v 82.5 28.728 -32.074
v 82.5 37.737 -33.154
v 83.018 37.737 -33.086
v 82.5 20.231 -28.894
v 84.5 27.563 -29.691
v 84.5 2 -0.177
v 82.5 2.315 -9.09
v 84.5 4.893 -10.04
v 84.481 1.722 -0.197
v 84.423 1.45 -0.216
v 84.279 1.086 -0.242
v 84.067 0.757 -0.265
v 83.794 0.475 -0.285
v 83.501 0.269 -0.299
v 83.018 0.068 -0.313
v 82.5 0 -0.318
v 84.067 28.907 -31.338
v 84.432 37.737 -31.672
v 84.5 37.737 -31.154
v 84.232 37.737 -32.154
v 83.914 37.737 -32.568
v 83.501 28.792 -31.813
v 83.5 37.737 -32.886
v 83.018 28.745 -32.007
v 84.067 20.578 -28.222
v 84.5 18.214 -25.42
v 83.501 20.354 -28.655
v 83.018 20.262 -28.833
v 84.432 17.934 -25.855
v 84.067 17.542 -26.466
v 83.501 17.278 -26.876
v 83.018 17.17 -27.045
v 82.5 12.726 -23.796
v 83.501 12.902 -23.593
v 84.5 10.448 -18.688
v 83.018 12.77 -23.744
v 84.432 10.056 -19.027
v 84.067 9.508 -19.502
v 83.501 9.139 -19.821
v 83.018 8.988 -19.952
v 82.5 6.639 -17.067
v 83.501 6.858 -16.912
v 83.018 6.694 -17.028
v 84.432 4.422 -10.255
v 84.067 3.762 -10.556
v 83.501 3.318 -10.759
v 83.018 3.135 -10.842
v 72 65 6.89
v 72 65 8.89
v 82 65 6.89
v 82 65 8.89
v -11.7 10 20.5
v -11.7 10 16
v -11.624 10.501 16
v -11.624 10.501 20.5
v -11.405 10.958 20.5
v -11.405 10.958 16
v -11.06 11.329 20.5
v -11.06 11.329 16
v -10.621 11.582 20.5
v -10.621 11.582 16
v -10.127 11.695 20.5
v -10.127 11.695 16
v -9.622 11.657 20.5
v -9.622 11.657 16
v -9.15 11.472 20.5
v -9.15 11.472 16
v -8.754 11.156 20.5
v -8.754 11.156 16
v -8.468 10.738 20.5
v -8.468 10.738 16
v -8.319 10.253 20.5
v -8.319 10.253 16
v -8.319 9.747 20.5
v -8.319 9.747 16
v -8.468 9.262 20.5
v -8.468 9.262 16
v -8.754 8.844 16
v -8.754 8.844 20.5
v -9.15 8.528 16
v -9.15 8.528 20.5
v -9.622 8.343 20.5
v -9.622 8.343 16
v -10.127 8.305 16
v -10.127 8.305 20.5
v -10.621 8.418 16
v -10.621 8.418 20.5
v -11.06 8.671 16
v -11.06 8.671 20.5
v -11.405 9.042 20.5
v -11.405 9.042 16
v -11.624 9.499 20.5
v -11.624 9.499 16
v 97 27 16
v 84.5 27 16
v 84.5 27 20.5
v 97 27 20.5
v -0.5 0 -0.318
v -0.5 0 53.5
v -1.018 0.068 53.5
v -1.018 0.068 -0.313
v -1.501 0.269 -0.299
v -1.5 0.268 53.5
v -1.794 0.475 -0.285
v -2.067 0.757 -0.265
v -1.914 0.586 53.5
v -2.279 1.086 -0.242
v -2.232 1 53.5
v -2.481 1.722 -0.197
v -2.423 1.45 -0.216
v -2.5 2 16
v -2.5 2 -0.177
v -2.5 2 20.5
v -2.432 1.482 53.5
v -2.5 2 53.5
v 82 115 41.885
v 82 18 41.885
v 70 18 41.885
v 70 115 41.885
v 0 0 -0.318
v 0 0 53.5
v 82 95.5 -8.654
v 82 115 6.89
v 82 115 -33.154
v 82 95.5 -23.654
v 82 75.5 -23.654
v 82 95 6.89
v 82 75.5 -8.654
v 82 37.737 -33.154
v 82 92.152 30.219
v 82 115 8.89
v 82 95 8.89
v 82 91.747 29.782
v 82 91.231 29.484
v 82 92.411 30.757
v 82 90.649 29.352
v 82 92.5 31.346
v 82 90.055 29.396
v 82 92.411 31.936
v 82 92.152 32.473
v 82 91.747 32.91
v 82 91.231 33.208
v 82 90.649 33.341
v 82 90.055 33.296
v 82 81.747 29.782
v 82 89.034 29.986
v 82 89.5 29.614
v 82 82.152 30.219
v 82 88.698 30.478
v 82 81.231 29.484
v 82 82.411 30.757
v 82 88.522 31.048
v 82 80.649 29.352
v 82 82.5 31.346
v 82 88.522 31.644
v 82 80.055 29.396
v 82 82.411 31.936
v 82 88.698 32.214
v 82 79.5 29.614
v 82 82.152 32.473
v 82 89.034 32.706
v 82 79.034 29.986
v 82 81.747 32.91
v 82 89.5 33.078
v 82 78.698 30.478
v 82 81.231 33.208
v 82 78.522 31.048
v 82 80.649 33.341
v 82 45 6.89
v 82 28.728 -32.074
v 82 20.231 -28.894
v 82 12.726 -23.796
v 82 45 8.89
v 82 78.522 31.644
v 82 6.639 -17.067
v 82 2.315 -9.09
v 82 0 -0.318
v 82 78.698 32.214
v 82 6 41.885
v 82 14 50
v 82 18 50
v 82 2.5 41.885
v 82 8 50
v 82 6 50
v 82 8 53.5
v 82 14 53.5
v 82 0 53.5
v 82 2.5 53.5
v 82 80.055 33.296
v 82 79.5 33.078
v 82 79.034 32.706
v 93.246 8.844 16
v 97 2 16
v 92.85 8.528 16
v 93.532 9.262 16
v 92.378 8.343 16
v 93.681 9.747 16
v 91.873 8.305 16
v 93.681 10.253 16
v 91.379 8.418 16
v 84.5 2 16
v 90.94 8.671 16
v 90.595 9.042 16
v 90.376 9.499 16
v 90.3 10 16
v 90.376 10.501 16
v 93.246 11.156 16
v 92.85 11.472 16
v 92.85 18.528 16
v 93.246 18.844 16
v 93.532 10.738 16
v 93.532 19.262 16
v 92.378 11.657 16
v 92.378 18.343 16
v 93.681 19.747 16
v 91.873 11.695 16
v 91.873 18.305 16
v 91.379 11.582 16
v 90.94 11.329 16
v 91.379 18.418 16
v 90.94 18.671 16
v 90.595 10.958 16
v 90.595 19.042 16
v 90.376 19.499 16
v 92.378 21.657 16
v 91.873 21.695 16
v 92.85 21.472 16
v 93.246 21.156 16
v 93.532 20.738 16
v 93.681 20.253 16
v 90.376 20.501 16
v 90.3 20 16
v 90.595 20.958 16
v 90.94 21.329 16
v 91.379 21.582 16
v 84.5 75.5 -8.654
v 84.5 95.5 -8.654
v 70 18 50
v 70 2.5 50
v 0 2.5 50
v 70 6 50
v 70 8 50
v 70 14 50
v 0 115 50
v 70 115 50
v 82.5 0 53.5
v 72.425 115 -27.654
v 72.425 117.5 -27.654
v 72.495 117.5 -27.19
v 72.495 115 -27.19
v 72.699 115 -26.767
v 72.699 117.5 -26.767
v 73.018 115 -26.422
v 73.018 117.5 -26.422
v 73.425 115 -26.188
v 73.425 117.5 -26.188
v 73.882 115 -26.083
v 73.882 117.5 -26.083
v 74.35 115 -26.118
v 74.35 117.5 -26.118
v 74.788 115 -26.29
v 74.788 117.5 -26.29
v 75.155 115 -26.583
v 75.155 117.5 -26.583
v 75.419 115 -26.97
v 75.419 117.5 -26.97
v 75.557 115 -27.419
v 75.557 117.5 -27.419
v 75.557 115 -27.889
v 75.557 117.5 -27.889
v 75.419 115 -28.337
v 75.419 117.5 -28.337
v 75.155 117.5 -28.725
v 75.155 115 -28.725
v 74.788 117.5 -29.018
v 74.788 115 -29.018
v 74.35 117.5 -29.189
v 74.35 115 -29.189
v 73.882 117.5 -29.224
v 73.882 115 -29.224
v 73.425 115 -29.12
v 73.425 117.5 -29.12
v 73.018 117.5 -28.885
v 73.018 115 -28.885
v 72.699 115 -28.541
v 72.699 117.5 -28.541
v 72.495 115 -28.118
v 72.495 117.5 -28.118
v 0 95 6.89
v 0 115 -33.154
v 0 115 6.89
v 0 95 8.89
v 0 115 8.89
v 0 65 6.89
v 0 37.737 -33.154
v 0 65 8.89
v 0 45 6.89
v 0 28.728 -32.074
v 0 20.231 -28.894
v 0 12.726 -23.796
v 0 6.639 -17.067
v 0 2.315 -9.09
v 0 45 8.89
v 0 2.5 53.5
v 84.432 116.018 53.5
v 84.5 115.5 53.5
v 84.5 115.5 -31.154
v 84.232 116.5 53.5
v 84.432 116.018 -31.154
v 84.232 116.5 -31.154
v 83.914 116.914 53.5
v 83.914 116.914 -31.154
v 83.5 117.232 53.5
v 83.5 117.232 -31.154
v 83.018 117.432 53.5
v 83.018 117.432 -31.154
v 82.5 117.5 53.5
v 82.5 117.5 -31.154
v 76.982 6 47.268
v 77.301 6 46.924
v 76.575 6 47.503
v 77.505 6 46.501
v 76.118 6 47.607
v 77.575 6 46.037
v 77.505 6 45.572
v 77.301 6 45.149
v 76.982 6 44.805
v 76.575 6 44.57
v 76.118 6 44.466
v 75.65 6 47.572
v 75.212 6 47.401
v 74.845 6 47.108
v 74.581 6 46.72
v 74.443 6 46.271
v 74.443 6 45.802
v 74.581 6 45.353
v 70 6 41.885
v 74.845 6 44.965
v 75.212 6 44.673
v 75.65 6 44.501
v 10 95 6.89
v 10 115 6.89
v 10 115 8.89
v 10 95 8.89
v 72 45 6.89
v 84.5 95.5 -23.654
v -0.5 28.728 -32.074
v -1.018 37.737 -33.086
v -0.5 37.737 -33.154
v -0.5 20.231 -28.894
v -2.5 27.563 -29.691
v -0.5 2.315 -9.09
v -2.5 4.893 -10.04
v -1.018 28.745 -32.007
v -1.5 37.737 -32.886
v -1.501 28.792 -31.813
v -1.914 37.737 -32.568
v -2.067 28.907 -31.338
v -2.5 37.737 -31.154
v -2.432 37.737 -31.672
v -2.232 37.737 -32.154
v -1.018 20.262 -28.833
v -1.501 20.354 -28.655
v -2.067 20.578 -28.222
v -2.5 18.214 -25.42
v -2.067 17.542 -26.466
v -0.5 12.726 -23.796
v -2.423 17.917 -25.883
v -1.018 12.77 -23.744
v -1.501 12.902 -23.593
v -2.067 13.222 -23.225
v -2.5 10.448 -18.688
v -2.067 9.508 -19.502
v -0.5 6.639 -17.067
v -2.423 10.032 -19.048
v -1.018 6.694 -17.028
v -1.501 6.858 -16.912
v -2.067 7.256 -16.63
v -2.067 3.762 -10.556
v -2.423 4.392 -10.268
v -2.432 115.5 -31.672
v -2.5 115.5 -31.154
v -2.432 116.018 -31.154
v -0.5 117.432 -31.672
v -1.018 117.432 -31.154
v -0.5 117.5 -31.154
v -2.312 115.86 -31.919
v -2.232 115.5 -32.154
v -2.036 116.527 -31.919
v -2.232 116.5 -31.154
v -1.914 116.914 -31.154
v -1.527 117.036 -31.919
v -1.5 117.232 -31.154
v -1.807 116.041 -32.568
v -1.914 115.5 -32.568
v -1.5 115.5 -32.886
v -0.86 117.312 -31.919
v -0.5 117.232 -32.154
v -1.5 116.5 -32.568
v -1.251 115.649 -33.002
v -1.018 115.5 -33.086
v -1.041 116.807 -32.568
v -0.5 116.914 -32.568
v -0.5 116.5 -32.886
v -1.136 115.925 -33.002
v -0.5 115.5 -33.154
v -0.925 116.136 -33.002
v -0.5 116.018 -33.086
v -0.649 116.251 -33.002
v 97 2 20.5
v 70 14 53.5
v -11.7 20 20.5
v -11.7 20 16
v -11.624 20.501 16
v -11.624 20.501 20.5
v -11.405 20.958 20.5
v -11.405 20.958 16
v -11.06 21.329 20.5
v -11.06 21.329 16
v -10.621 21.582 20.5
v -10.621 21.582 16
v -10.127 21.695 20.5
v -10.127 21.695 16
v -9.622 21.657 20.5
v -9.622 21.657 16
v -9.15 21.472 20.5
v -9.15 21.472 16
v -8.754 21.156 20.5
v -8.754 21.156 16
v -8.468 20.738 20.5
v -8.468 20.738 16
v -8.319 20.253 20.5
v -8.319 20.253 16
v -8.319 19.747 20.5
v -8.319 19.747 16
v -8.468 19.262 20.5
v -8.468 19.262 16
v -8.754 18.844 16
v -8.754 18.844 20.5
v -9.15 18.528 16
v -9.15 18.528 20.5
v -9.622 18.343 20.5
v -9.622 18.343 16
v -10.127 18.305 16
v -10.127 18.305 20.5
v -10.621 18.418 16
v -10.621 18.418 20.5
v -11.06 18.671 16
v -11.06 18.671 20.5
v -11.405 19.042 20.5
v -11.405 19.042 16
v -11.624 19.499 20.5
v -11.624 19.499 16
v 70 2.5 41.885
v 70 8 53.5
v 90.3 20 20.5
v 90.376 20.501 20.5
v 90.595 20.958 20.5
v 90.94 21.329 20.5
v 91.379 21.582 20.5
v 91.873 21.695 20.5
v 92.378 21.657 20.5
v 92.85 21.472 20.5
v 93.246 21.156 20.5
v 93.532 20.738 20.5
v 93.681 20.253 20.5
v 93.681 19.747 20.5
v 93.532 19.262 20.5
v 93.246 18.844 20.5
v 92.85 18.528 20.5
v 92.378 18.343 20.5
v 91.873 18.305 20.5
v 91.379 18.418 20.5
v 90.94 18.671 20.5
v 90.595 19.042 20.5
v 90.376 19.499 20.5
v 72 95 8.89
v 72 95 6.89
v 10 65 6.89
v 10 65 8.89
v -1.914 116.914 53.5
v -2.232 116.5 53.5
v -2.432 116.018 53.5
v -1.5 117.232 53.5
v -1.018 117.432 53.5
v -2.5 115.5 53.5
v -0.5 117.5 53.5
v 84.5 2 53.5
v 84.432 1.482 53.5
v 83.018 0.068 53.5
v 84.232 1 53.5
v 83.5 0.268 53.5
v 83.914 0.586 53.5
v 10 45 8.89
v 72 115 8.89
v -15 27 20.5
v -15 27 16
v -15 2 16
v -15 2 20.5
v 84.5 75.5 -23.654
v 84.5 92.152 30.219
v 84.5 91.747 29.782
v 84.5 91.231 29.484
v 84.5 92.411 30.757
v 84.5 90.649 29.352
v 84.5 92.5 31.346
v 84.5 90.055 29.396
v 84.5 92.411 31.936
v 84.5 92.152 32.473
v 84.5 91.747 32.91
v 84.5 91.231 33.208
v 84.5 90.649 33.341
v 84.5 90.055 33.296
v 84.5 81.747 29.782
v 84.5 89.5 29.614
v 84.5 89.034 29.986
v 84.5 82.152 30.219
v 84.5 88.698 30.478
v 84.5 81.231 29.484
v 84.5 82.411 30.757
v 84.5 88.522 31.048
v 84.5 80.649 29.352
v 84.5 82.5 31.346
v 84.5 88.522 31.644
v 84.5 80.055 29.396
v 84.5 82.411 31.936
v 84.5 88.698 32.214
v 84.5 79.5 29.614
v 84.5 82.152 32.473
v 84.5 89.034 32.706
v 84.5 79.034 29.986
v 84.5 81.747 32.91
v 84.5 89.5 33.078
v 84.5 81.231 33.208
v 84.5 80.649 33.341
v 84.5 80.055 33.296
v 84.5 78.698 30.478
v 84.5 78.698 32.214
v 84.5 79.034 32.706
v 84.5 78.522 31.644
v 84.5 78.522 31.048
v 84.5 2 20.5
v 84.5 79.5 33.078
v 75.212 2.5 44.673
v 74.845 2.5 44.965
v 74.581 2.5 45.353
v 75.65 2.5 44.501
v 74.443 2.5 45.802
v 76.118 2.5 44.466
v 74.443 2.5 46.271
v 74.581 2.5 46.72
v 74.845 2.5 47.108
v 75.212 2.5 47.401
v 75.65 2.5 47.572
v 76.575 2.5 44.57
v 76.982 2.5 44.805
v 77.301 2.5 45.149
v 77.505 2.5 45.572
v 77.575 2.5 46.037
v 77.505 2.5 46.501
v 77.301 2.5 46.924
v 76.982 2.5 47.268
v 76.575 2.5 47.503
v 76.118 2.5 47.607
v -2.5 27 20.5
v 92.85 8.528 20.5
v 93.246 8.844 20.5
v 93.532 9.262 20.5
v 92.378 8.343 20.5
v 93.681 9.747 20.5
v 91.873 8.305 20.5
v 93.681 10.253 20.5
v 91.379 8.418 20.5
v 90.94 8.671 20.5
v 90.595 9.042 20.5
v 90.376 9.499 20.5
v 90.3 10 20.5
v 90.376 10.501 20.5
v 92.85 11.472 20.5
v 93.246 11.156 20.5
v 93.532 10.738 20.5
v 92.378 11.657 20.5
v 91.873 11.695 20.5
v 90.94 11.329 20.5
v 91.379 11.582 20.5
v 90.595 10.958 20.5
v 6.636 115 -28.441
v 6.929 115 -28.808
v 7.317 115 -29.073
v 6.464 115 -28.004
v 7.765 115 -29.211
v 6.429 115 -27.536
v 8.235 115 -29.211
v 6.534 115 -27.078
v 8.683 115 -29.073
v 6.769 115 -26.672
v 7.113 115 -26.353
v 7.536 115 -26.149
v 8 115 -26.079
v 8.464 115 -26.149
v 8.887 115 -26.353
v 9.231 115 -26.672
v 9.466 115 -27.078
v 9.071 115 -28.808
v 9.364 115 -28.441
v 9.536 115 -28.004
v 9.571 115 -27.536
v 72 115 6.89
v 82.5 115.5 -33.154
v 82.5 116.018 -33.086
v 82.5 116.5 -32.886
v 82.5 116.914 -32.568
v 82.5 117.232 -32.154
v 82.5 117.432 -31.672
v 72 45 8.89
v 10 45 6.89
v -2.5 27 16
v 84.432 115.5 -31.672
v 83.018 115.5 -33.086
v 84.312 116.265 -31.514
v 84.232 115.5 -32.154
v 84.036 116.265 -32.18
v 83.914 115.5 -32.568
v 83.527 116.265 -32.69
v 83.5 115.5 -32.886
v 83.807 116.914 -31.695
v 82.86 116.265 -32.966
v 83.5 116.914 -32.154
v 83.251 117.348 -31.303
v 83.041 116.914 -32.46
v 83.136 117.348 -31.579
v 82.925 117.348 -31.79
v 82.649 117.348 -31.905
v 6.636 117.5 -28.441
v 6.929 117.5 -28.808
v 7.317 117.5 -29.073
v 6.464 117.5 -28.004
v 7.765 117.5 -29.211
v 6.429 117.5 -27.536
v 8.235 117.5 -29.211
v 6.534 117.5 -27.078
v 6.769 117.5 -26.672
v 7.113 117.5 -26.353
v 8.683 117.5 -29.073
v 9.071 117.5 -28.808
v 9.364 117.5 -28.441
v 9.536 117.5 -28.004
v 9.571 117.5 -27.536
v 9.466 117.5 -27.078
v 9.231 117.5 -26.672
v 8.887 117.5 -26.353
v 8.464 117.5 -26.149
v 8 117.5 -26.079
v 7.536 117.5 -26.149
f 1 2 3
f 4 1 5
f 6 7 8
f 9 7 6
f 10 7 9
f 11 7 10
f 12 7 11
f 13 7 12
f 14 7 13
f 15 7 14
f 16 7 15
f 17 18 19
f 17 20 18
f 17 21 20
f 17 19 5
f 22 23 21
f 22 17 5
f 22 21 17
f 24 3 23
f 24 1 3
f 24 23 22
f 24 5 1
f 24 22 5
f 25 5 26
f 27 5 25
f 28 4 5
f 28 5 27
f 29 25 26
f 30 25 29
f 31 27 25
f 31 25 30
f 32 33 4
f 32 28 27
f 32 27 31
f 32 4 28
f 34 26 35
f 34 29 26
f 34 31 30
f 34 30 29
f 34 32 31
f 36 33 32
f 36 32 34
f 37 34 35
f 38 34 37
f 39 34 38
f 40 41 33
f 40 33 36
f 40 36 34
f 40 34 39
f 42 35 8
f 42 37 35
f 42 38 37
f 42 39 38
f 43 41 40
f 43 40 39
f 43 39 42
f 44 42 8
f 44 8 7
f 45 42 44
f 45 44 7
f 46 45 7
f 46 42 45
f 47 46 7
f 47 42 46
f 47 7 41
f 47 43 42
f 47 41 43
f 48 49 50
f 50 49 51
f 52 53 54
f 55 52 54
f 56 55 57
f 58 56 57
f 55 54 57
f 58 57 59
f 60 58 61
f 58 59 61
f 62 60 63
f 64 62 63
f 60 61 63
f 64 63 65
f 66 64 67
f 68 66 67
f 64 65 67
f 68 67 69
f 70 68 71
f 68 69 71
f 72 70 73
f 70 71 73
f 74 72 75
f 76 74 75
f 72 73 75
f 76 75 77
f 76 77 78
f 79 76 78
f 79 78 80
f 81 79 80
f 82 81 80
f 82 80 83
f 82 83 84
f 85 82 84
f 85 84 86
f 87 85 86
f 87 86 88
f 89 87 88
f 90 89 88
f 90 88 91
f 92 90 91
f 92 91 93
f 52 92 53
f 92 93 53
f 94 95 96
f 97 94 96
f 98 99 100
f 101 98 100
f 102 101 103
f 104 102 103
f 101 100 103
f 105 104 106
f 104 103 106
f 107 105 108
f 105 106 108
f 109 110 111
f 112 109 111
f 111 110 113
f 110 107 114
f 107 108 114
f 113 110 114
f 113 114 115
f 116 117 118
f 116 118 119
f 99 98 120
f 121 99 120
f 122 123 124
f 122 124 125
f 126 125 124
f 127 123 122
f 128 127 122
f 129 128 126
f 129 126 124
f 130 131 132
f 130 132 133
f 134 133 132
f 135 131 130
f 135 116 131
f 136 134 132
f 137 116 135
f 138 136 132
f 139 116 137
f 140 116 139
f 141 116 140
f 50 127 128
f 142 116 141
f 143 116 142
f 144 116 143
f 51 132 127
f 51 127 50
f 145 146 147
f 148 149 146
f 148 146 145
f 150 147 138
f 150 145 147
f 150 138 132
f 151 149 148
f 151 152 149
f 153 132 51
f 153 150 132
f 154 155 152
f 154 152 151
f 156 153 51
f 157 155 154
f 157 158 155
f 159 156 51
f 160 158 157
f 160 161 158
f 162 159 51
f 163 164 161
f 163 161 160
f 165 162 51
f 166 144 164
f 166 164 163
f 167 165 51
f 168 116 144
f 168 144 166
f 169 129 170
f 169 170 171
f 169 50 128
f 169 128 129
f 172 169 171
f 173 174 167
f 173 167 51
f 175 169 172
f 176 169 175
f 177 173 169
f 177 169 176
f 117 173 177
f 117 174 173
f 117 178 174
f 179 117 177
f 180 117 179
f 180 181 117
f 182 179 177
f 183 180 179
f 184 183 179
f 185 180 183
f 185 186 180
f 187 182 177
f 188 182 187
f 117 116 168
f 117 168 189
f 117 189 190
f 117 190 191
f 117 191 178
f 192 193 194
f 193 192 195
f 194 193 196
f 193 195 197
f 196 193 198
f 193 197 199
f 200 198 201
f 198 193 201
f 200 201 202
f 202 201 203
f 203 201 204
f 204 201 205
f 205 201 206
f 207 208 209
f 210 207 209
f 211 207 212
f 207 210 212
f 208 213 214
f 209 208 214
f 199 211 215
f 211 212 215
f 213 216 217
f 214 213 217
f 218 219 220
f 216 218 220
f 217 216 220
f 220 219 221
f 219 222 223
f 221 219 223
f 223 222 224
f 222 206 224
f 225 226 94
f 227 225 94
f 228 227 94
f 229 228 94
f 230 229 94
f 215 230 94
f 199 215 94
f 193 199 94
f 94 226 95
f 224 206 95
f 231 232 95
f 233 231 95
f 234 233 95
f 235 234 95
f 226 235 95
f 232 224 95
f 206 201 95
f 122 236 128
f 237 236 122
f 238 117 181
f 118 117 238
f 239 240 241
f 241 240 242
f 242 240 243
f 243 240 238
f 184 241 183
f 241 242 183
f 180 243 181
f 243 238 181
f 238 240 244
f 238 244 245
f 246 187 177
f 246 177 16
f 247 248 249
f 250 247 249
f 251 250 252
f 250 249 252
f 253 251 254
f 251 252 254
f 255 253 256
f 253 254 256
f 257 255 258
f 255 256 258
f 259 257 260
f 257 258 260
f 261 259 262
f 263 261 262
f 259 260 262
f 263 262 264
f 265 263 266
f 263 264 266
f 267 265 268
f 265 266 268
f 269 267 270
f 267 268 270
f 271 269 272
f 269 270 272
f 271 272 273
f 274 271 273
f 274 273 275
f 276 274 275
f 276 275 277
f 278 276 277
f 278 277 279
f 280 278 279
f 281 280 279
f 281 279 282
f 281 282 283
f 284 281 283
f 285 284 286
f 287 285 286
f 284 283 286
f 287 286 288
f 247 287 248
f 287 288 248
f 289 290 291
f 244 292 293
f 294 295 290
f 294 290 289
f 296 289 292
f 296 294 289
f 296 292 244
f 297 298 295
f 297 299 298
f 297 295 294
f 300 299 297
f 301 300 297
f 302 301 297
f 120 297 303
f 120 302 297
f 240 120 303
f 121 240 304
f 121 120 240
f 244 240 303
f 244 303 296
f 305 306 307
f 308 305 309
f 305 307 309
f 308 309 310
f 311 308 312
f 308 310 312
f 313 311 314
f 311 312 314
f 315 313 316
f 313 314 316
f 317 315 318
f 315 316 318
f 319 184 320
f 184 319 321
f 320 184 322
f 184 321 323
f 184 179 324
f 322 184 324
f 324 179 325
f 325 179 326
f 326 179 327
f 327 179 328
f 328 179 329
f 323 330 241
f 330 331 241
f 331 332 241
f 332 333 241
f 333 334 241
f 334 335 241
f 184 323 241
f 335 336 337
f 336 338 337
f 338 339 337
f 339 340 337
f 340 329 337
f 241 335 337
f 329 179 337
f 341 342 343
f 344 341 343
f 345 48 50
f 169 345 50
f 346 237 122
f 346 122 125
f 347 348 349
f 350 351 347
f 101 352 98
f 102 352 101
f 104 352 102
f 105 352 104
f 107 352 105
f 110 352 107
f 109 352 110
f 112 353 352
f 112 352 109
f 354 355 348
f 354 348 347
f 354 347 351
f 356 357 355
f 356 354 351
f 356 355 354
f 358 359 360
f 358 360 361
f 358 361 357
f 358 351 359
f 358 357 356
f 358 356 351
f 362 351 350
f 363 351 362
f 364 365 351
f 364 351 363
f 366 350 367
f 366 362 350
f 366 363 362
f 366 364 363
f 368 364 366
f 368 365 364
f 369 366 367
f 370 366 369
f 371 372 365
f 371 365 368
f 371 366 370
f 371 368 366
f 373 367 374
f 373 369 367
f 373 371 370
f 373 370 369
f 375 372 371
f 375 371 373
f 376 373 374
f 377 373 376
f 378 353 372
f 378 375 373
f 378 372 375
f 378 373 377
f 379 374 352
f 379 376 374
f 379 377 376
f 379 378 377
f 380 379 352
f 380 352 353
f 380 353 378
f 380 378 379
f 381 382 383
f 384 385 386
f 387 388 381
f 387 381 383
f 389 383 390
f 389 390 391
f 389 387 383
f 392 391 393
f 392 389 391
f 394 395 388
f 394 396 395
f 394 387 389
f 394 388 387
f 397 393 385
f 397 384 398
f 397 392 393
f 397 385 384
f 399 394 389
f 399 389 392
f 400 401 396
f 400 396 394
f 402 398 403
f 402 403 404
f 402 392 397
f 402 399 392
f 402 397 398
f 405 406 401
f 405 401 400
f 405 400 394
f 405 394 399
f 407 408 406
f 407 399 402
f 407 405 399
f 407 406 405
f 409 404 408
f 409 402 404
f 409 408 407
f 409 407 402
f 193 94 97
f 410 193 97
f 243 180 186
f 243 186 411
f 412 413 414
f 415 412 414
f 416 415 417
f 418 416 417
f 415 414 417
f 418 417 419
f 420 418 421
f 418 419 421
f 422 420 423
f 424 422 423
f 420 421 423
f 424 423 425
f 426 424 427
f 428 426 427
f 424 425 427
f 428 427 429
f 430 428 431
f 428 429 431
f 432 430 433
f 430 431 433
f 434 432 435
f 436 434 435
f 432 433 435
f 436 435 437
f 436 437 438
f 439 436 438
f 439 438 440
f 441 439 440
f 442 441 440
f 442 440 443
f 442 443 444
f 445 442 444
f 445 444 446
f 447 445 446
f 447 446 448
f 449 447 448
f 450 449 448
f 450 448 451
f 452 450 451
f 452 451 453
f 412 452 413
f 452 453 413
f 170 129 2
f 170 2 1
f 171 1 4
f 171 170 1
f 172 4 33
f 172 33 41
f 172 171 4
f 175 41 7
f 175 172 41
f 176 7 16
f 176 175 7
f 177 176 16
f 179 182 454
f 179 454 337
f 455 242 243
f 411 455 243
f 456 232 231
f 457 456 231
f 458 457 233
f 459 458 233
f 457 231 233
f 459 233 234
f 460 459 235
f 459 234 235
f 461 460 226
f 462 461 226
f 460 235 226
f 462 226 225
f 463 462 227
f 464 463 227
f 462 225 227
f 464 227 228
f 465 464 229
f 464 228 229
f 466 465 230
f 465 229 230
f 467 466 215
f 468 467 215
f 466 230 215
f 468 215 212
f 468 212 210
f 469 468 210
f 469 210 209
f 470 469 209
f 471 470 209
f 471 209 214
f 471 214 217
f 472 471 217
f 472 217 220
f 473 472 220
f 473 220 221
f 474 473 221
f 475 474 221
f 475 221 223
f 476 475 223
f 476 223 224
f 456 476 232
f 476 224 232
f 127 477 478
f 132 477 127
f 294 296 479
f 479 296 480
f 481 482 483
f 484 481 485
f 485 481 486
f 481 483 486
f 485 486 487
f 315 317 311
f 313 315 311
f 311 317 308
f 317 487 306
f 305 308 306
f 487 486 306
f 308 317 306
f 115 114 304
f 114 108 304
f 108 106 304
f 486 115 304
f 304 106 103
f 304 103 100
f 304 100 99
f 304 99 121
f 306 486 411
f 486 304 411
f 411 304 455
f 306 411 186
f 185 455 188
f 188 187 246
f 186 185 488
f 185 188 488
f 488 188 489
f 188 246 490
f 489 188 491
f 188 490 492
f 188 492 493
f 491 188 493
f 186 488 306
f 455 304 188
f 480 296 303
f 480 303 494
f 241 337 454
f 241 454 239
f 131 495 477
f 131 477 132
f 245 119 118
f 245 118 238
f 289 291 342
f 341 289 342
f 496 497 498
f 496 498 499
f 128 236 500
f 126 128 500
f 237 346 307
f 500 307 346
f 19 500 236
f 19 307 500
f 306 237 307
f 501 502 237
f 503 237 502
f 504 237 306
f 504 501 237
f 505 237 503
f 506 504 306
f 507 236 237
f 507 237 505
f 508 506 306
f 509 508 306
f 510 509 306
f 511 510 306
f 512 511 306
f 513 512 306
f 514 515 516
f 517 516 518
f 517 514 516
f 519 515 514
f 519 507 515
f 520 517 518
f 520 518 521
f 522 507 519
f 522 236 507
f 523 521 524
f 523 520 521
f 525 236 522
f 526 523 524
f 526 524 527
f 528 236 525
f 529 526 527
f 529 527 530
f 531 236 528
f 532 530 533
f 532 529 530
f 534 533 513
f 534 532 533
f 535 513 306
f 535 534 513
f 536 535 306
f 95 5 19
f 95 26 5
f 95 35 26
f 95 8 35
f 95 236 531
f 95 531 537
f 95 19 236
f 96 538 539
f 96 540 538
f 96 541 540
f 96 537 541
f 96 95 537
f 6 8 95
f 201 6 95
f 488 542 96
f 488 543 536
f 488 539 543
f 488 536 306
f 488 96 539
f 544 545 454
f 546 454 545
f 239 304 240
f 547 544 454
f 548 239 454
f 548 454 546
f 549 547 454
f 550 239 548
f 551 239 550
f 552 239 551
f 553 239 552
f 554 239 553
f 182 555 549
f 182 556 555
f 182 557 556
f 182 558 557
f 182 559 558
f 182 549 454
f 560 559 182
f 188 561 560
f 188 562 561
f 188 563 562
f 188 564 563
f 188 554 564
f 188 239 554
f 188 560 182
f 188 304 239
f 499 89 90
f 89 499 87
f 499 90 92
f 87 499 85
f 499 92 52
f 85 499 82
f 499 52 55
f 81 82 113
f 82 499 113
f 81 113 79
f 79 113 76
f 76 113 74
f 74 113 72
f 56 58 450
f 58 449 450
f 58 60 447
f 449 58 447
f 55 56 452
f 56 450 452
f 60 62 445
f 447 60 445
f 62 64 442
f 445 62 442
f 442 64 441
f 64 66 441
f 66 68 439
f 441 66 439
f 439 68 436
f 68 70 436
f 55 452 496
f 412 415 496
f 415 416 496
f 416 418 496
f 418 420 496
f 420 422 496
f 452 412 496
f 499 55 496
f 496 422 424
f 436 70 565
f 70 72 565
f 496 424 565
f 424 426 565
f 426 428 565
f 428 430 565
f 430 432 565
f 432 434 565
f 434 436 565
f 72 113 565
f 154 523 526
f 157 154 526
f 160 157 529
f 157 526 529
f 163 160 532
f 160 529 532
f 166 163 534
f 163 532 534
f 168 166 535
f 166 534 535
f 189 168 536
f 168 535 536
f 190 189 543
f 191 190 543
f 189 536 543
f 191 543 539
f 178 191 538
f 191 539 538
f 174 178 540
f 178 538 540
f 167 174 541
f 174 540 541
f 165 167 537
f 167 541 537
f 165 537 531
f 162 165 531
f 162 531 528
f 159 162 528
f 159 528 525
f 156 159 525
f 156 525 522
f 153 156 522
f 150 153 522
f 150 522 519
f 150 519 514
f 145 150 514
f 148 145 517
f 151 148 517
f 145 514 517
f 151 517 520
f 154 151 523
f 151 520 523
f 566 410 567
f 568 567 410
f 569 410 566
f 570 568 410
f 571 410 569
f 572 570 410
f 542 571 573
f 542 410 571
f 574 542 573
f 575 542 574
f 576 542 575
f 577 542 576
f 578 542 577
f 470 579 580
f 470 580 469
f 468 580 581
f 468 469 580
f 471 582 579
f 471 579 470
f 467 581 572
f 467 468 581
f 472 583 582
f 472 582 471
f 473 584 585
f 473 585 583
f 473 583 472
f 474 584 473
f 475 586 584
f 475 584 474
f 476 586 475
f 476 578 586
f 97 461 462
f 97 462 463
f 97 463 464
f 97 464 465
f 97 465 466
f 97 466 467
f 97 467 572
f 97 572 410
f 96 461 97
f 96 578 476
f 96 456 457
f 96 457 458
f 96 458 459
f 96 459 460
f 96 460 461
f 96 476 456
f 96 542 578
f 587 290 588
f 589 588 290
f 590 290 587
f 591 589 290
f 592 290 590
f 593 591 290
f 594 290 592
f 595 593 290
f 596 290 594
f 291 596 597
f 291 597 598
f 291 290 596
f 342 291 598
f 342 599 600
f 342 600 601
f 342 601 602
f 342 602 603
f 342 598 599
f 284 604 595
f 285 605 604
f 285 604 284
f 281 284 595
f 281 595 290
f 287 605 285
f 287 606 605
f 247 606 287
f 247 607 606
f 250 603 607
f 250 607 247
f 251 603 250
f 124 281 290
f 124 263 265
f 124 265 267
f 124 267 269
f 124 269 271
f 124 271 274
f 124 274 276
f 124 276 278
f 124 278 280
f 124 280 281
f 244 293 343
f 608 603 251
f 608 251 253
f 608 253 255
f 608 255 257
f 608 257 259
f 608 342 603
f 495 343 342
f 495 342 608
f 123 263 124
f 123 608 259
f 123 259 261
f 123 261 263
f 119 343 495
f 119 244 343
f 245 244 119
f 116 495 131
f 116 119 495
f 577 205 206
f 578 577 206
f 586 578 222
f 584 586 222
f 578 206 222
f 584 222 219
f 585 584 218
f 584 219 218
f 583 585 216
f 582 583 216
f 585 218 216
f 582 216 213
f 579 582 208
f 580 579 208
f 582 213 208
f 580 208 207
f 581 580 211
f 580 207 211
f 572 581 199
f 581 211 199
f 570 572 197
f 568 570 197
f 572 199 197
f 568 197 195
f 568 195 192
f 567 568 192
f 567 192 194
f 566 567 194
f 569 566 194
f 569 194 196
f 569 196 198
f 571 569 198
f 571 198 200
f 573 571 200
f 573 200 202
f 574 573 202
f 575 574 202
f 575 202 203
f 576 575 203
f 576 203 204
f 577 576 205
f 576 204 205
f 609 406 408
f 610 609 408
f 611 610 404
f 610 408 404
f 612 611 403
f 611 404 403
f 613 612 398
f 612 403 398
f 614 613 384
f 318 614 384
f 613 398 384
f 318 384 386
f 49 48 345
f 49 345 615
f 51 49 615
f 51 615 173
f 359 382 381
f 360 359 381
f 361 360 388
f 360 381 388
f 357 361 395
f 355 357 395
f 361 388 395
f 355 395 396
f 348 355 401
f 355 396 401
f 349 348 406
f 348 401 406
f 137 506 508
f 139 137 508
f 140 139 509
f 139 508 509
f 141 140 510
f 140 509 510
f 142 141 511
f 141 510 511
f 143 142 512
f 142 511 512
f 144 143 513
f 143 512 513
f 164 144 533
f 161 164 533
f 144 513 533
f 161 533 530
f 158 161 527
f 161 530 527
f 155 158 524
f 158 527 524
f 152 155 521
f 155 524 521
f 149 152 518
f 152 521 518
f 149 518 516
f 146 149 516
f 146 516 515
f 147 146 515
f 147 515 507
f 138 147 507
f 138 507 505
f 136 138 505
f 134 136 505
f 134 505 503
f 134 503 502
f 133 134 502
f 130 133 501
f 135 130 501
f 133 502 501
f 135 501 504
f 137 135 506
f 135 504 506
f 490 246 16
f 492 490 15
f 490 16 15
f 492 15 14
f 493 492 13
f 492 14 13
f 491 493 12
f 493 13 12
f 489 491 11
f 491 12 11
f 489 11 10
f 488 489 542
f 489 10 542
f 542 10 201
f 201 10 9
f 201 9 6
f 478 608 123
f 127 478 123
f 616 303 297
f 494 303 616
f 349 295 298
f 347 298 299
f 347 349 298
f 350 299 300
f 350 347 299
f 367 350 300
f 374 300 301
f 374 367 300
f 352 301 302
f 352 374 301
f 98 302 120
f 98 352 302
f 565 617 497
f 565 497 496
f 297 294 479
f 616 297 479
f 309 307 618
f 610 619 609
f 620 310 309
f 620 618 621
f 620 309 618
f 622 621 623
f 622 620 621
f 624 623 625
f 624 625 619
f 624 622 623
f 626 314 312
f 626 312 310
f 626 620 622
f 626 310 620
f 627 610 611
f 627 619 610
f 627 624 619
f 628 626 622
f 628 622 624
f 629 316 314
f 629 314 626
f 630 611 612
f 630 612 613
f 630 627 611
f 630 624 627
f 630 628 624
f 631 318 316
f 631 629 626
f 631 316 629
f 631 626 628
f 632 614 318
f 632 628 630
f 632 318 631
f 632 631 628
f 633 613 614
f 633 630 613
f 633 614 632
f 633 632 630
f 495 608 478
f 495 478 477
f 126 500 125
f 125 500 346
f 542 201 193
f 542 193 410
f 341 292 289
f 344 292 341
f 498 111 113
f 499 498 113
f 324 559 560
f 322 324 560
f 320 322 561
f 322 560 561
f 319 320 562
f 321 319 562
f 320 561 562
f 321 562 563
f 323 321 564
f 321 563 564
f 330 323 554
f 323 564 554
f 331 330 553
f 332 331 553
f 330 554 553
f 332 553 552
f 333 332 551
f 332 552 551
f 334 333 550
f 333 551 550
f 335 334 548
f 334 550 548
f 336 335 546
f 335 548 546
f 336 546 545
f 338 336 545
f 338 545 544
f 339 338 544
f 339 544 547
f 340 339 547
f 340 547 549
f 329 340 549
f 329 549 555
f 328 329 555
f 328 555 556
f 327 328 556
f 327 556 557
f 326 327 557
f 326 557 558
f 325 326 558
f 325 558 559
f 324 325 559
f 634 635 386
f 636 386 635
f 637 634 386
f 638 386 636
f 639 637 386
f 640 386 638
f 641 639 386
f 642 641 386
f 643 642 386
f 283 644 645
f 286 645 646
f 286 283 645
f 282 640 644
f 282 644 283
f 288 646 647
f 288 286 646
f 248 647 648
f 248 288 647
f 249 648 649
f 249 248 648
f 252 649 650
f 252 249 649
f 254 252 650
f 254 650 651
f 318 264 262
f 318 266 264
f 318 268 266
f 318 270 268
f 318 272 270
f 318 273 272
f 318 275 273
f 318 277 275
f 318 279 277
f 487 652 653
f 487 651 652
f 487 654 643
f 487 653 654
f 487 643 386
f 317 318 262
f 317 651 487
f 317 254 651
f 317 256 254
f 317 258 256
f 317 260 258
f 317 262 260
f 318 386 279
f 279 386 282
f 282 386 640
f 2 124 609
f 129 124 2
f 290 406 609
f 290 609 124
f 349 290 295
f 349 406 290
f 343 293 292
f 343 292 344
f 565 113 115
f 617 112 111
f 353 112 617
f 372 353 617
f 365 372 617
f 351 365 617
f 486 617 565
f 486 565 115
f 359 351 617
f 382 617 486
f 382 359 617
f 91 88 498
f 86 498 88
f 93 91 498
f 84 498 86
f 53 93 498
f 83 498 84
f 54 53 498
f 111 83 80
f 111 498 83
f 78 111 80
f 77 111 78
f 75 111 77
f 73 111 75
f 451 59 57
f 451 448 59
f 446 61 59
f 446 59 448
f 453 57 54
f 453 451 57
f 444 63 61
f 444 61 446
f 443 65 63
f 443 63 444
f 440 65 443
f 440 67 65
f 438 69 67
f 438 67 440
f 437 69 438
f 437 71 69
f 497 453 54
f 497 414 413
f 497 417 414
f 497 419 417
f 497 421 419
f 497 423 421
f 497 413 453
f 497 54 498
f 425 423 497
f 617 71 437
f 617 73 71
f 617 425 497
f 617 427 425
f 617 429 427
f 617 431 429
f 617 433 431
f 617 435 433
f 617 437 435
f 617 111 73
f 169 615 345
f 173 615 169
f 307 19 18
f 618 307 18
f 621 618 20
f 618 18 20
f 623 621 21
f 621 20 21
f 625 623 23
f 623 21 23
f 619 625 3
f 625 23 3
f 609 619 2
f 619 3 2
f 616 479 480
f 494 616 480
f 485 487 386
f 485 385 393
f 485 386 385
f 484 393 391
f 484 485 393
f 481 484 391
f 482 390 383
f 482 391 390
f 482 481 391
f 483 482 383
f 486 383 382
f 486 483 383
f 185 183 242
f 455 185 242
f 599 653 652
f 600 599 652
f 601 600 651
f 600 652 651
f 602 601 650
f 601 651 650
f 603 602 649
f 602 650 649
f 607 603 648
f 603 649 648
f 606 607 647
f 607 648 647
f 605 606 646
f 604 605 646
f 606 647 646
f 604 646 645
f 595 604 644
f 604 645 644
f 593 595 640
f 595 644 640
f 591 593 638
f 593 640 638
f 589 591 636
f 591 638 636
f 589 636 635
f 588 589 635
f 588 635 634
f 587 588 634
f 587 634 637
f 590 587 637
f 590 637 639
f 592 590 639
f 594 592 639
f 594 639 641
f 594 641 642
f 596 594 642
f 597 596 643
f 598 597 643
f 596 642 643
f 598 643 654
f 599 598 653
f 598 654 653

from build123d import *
from build123d.topology import SkipClean

# Parameters (mm, degrees)
BOSS_EXTRUDE1_DEPTH     = 50
SKETCH3_W               = 92
SKETCH3_H               = 120
BOSS_EXTRUDE2_DEPTH     = 5
SKETCH4_W               = 8.115199035
SKETCH4_H               = 120
BOSS_EXTRUDE3_DEPTH     = 12
BOSS_EXTRUDE4_DEPTH     = 60
SKETCH5_W               = 10
SKETCH5_H               = 2
BOSS_EXTRUDE5_DEPTH     = 20
BOSS_EXTRUDE6_START     = 50
SKETCH5_2_W             = 10
SKETCH5_2_H             = 2
BOSS_EXTRUDE6_DEPTH     = 20
SKETCH6_W               = 92
SKETCH6_H               = 120
BOSS_EXTRUDE7_DEPTH     = 5
SKETCH7_W               = 7
SKETCH7_H               = 10
SKETCH7_R               = 1.6
BOSS_EXTRUDE8_DEPTH     = 3
CUT_EXTRUDE2_DEPTH      = 164.816971038
CUT_EXTRUDE4_DEPTH      = 165.373051319
CUT_EXTRUDE4_DEPTH_BACK = 165.373051319
SKETCH12_W              = 112.5
SKETCH12_H              = 2.5
SKETCH14_W              = 106
SKETCH14_H              = 1.5
CUT_EXTRUDE5_DEPTH      = 162.085381087
SKETCH15_R              = 1.6
BOSS_EXTRUDE10_DEPTH    = 2
SKETCH16_W              = 87
SKETCH16_H              = 3.364665628
CUT_EXTRUDE6_DEPTH      = 162.085381087
SKETCH17_W              = 10
SKETCH17_H              = 2
CUT_EXTRUDE7_DEPTH      = 70
SKETCH19_W              = 7
SKETCH19_H              = 10
SKETCH19_R              = 1.6
BOSS_EXTRUDE11_DEPTH    = 3.5
SKETCH21_W              = 7
SKETCH21_H              = 10
SKETCH21_R              = 1.6
BOSS_EXTRUDE13_DEPTH    = 3.5
SKETCH22_W              = 9.5
SKETCH22_H              = 117.5
CUT_EXTRUDE8_DEPTH      = 186.007067988
CUT_EXTRUDE9_DEPTH      = 156.903445849
SKETCH26_W              = 12
SKETCH26_H              = 12
CUT_EXTRUDE10_DEPTH     = 8.115199035
SKETCH27_R              = 1.575
CUT_EXTRUDE11_DEPTH     = 6
SKETCH28_W              = 82
SKETCH28_H              = 11.615199035
CUT_EXTRUDE12_DEPTH     = 2.5
SKETCH30_R              = 1.575
CUT_EXTRUDE13_DEPTH     = 2.5
SKETCH31_W              = 12
SKETCH31_H              = 6
CUT_EXTRUDE14_DEPTH     = 3.5
FILLET1_R               = 2
FILLET2_R               = 2
SKETCH32_W              = 15
SKETCH32_H              = 20
CUT_EXTRUDE15_DEPTH     = 2.5
SKETCH33_R              = 2
CUT_EXTRUDE16_DEPTH     = 2.5
SKETCH37_W              = 4.5
SKETCH37_H              = 25
BOSS_EXTRUDE17_DEPTH    = 12.5
BOSS_EXTRUDE18_START    = -87
SKETCH37_2_W            = 4.5
SKETCH37_2_H            = 25
BOSS_EXTRUDE18_DEPTH    = 12.5
SKETCH39_R              = 1.7
CUT_EXTRUDE17_DEPTH     = 4.5
SKETCH40_R              = 1.7
CUT_EXTRUDE18_DEPTH     = 4.5


with BuildPart() as part:
    # Sketch2 → Boss-Extrude1 (new body)
    with BuildSketch(Plane.XY):
        Polygon((0, 0), (0, 115), (82, 115), (82, 0), (87, 0), (87, 120), (-5, 120), (-5, 0), align=None)
    extrude(amount=BOSS_EXTRUDE1_DEPTH)

    # Sketch3 → Boss-Extrude2 (add)
    with BuildSketch(Plane.XY.offset(50)):
        with Locations((41, 60)):
            Rectangle(SKETCH3_W, SKETCH3_H)
    extrude(amount=BOSS_EXTRUDE2_DEPTH)

    # Sketch4 → Boss-Extrude3 (add)
    with BuildSketch(Plane.ZY.offset(-82)):
        with Locations((45.942400483, 60)):
            Rectangle(SKETCH4_W, SKETCH4_H)
    extrude(amount=BOSS_EXTRUDE3_DEPTH)

    # Sketch2<2> → Boss-Extrude4 (add)
    with BuildSketch(Plane.XY):
        Polygon((0, 0), (0, 115), (82, 115), (82, 0), (87, 0), (87, 120), (-5, 120), (-5, 0), align=None)
    extrude(amount=-BOSS_EXTRUDE4_DEPTH)

    # Sketch5 → Boss-Extrude5 (add)
    with BuildSketch(Plane.XZ.offset(-115)):
        with Locations((5, 7.889828052)):
            Rectangle(SKETCH5_W, SKETCH5_H)
        with Locations((5, 2.689828052)):
            Rectangle(SKETCH5_W, SKETCH5_H)
        with Locations((77, 2.689828052)):
            Rectangle(SKETCH5_W, SKETCH5_H)
        with Locations((77, 7.889828052)):
            Rectangle(SKETCH5_W, SKETCH5_H)
    extrude(amount=BOSS_EXTRUDE5_DEPTH)

    # Sketch5<2> → Boss-Extrude6 (add)
    with BuildSketch(Plane.XZ.offset(-115).offset(BOSS_EXTRUDE6_START)):
        with Locations((5, 7.889828052)):
            Rectangle(SKETCH5_2_W, SKETCH5_2_H)
        with Locations((5, 2.689828052)):
            Rectangle(SKETCH5_2_W, SKETCH5_2_H)
        with Locations((77, 2.689828052)):
            Rectangle(SKETCH5_2_W, SKETCH5_2_H)
        with Locations((77, 7.889828052)):
            Rectangle(SKETCH5_2_W, SKETCH5_2_H)
    extrude(amount=BOSS_EXTRUDE6_DEPTH)

    # Sketch6 → Boss-Extrude7 (add)
    with BuildSketch(Plane(origin=(0, 0, -60), x_dir=(-1, 0, 0), z_dir=(0, 0, -1))):
        with Locations((-41, 60)):
            Rectangle(SKETCH6_W, SKETCH6_H)
    extrude(amount=-BOSS_EXTRUDE7_DEPTH)

    # Sketch7 → Boss-Extrude8 (add)
    # profile 1 of 4: a face of its own
    with BuildSketch(Plane.XY.offset(55)):
        with Locations((90.5, 115)):
            Rectangle(SKETCH7_W, SKETCH7_H)
        with Locations((90.472155735, 113.006992181)):
            Circle(SKETCH7_R, mode=Mode.SUBTRACT)
    # profile 2 of 4: a face of its own
    with BuildSketch(Plane.XY.offset(55)):
        with Locations((-8.5, 115)):
            Rectangle(SKETCH7_W, SKETCH7_H)
        with Locations(Location((-8.472155735, 113.006992181, 0), (0, 0, 180))):
            Circle(SKETCH7_R, mode=Mode.SUBTRACT)
    # profile 3 of 4: a face of its own
    with BuildSketch(Plane.XY.offset(55)):
        with Locations((-8.5, 5)):
            Rectangle(SKETCH7_W, SKETCH7_H)
        with Locations((-8.472155735, 6.993007819)):
            Circle(SKETCH7_R, mode=Mode.SUBTRACT)
    # profile 4 of 4: a face of its own
    with BuildSketch(Plane.XY.offset(55)):
        with Locations((90.5, 5)):
            Rectangle(SKETCH7_W, SKETCH7_H)
        with Locations(Location((90.472155735, 6.993007819, 0), (0, 0, 180))):
            Circle(SKETCH7_R, mode=Mode.SUBTRACT)
    extrude(amount=-BOSS_EXTRUDE8_DEPTH)

    # Sketch11 → Cut-Extrude2 (cut, through all)
    with BuildSketch(Plane.XZ):
        Polygon((-5, 52), (-2.5, 52), (-2.5, -57.5), (84.5, -57.5), (84.5, 52), (87, 52), (87, -60), (-5, -60), align=None)
    extrude(amount=-CUT_EXTRUDE2_DEPTH, mode=Mode.SUBTRACT)

    # Sketch12 → Cut-Extrude4 (cut, two sides: drawn at the far end of the back side and taken through both)
    with BuildSketch(Plane.ZY.offset(2.5).offset(-CUT_EXTRUDE4_DEPTH_BACK)):
        with Locations((-1.25, 118.75)):
            Rectangle(SKETCH12_W, SKETCH12_H)
    extrude(amount=CUT_EXTRUDE4_DEPTH + CUT_EXTRUDE4_DEPTH_BACK, mode=Mode.SUBTRACT)

    # Sketch14 → Cut-Extrude5 (cut, through all)
    with BuildSketch(Plane.XZ):
        with Locations((41, 54.25)):
            Rectangle(SKETCH14_W, SKETCH14_H)
    extrude(amount=-CUT_EXTRUDE5_DEPTH, mode=Mode.SUBTRACT)

    # Sketch15 → Boss-Extrude10 (add)
    # profile 1 of 2: a face of its own
    with SkipClean():  # the faces are left unmerged after this step: merging them gives an invalid solid
        with BuildSketch(Plane(origin=(0, 0, 52), x_dir=(-1, 0, 0), z_dir=(0, 0, -1))):
            Polygon((-84.5, 117.5), (-94, 117.5), (-94, 110), (-87, 110), (-87, 10), (-94, 10), (-94, 0), (-84.5, 0), align=None)
            with Locations((-90.472155735, 113.006992181)):
                Circle(SKETCH15_R, mode=Mode.SUBTRACT)
            with Locations((-90.472155735, 6.993007819)):
                Circle(SKETCH15_R, mode=Mode.SUBTRACT)
        # profile 2 of 2: a face of its own
        with BuildSketch(Plane(origin=(0, 0, 52), x_dir=(-1, 0, 0), z_dir=(0, 0, -1))):
            Polygon((2.5, 0), (2.5, 117.5), (12, 117.5), (12, 110), (5, 110), (5, 10), (12, 10), (12, 0), align=None)
            with Locations(Location((8.472155735, 113.006992181, 0), (0, 0, 180))):
                Circle(SKETCH15_R, mode=Mode.SUBTRACT)
            with Locations(Location((8.472155735, 6.993007819, 0), (0, 0, 180))):
                Circle(SKETCH15_R, mode=Mode.SUBTRACT)
        extrude(amount=BOSS_EXTRUDE10_DEPTH)

    # Sketch16 → Cut-Extrude6 (cut, through all)
    with SkipClean():  # the faces are left unmerged after this step: merging them gives an invalid solid
        with BuildSketch(Plane.XZ):
            with Locations((41, -55.817667186)):
                Rectangle(SKETCH16_W, SKETCH16_H)
        extrude(amount=-CUT_EXTRUDE6_DEPTH, mode=Mode.SUBTRACT)

    # Sketch17 → Cut-Extrude7 (cut)
    with SkipClean():  # the faces are left unmerged after this step: merging them gives an invalid solid
        with BuildSketch(Plane.XZ.offset(-45)):
            with Locations((5, 2.689828052)):
                Rectangle(SKETCH17_W, SKETCH17_H)
            with Locations((77, 2.689828052)):
                Rectangle(SKETCH17_W, SKETCH17_H)
        extrude(amount=-CUT_EXTRUDE7_DEPTH, mode=Mode.SUBTRACT)

    # Sketch19 → Boss-Extrude11 (add)
    # profile 1 of 4: a face of its own
    with SkipClean():  # the faces are left unmerged after this step: merging them gives an invalid solid
        with BuildSketch(Plane.XZ):
            with Locations((88, -49.135334372)):
                Rectangle(SKETCH19_W, SKETCH19_H)
            with Locations((87.901562489, -49.234834013)):
                Circle(SKETCH19_R, mode=Mode.SUBTRACT)
        # profile 2 of 4: a face of its own
        with BuildSketch(Plane.XZ):
            with Locations((-6, -49.135334372)):
                Rectangle(SKETCH19_W, SKETCH19_H)
            with Locations(Location((-5.901562489, -49.234834013, 0), (0, 0, 180))):
                Circle(SKETCH19_R, mode=Mode.SUBTRACT)
        # profile 3 of 4: a face of its own
        with BuildSketch(Plane.XZ):
            with Locations((-6, 34.080676656)):
                Rectangle(SKETCH19_W, SKETCH19_H)
            with Locations((-5.901562489, 34.180176298)):
                Circle(SKETCH19_R, mode=Mode.SUBTRACT)
        # profile 4 of 4: a face of its own
        with BuildSketch(Plane.XZ):
            with Locations((88, 34.080676656)):
                Rectangle(SKETCH19_W, SKETCH19_H)
            with Locations(Location((87.901562489, 34.180176298, 0), (0, 0, 180))):
                Circle(SKETCH19_R, mode=Mode.SUBTRACT)
        extrude(amount=-BOSS_EXTRUDE11_DEPTH)

    # Sketch21 → Boss-Extrude13 (add)
    # profile 1 of 4: a face of its own
    with SkipClean():  # the faces are left unmerged after this step: merging them gives an invalid solid
        with BuildSketch(Plane(origin=(0, 0, -54.135334372), x_dir=(-1, 0, 0), z_dir=(0, 0, -1))):
            with Locations((-88, 112.5)):
                Rectangle(SKETCH21_W, SKETCH21_H)
            with Locations((-87.460864154, 112.996655596)):
                Circle(SKETCH21_R, mode=Mode.SUBTRACT)
        # profile 2 of 4: a face of its own
        with BuildSketch(Plane(origin=(0, 0, -54.135334372), x_dir=(-1, 0, 0), z_dir=(0, 0, -1))):
            with Locations((6, 112.5)):
                Rectangle(SKETCH21_W, SKETCH21_H)
            with Locations(Location((5.460864154, 112.996655596, 0), (0, 0, 180))):
                Circle(SKETCH21_R, mode=Mode.SUBTRACT)
        # profile 3 of 4: a face of its own
        with BuildSketch(Plane(origin=(0, 0, -54.135334372), x_dir=(-1, 0, 0), z_dir=(0, 0, -1))):
            with Locations((6, 17.859776919)):
                Rectangle(SKETCH21_W, SKETCH21_H)
            with Locations((5.460864154, 17.363121322)):
                Circle(SKETCH21_R, mode=Mode.SUBTRACT)
        # profile 4 of 4: a face of its own
        with BuildSketch(Plane(origin=(0, 0, -54.135334372), x_dir=(-1, 0, 0), z_dir=(0, 0, -1))):
            with Locations((-88, 17.859776919)):
                Rectangle(SKETCH21_W, SKETCH21_H)
            with Locations(Location((-87.460864154, 17.363121322, 0), (0, 0, 180))):
                Circle(SKETCH21_R, mode=Mode.SUBTRACT)
        extrude(amount=-BOSS_EXTRUDE13_DEPTH)

    # Sketch22 → Cut-Extrude8 (cut, through all)
    with BuildSketch(Plane(origin=(0, 0, -54.135334372), x_dir=(-1, 0, 0), z_dir=(0, 0, -1))):
        with Locations((7.25, 58.75)):
            Rectangle(SKETCH22_W, SKETCH22_H)
        with Locations((-89.25, 58.75)):
            Rectangle(SKETCH22_W, SKETCH22_H)
    extrude(amount=-CUT_EXTRUDE8_DEPTH, mode=Mode.SUBTRACT)

    # Sketch24 → Cut-Extrude9 (cut, through all)
    with BuildSketch(Plane.ZY.offset(2.5)):
        with BuildLine():
            Line((-33.153862192, 117.5), (-33.153862192, 37.737088179))
            ThreePointArc((-33.153862192, 37.737088179), (-23.795591024, 12.725573197), (-0.317667186, 0))
            Line((-0.317667186, 0), (-54.135334372, 0))
            Line((-54.135334372, 0), (-54.135334372, 117.5))
            Line((-54.135334372, 117.5), (-33.153862192, 117.5))
        make_face()
    extrude(amount=-CUT_EXTRUDE9_DEPTH, mode=Mode.SUBTRACT)

    # Sketch26 → Cut-Extrude10 (cut)
    with BuildSketch(Plane(origin=(0, 0, 41.884800965), x_dir=(-1, 0, 0), z_dir=(0, 0, -1))):
        with Locations((-76, 12)):
            Rectangle(SKETCH26_W, SKETCH26_H)
    extrude(amount=-CUT_EXTRUDE10_DEPTH, mode=Mode.SUBTRACT)

    # Sketch27 → Cut-Extrude11 (cut)
    with BuildSketch(Plane.XZ):
        with Locations((76, 46.036602525)):
            Circle(SKETCH27_R)
    extrude(amount=-CUT_EXTRUDE11_DEPTH, mode=Mode.SUBTRACT)

    # Sketch28 → Cut-Extrude12 (cut)
    with BuildSketch(Plane.XZ):
        with Locations((41, 47.692400483)):
            Rectangle(SKETCH28_W, SKETCH28_H)
    extrude(amount=-CUT_EXTRUDE12_DEPTH, mode=Mode.SUBTRACT)

    # Sketch30 → Cut-Extrude13 (cut)
    with BuildSketch(Plane(origin=(0, 117.5, 0), x_dir=(1, 0, 0), z_dir=(0, 1, 0))):
        with Locations(Location((74, 27.653862192, 0), (0, 0, 180))):
            Circle(SKETCH30_R)
        with Locations(Location((8, 27.653862192, 0), (0, 0, 270))):
            Circle(SKETCH30_R)
    extrude(amount=-CUT_EXTRUDE13_DEPTH, mode=Mode.SUBTRACT)

    # Sketch31 → Cut-Extrude14 (cut)
    with BuildSketch(Plane(origin=(0, 0, 50), x_dir=(-1, 0, 0), z_dir=(0, 0, -1))):
        with Locations((-76, 11)):
            Rectangle(SKETCH31_W, SKETCH31_H)
    extrude(amount=-CUT_EXTRUDE14_DEPTH, mode=Mode.SUBTRACT)

    # Fillet1
    fillet1_edges = [part.edges().sort_by_distance(p)[0] for p in [
        (-2.5, 117.5, 10.173068904),
    ]]
    fillet(fillet1_edges, radius=FILLET1_R)

    # Fillet2
    # the kernel refuses this fillet: 2 mm, written as the material it takes off along each edge
    with BuildSketch(Plane(origin=(82.5, 115.5, -31.153862192), x_dir=(1, 0, 0), z_dir=(0, 1, 0))) as fillet2_piece_1_section:
        Polygon((0, 0), (FILLET2_R, 0), (FILLET2_R, FILLET2_R), (0, FILLET2_R), align=None)
    fillet2_piece_1 = extrude(amount=FILLET2_R, mode=Mode.PRIVATE)
    fillet2_piece_1 = fillet2_piece_1 - Plane(origin=(82.5, 115.5, -31.153862192), x_dir=(-0.7071067811865477, 0, 0.7071067811865475), z_dir=(0, 1, 0)) * Sphere(FILLET2_R, mode=Mode.PRIVATE)
    add(fillet2_piece_1, mode=Mode.SUBTRACT)
    with BuildSketch(Plane(origin=(-0.5, 115.5, -33.153862192), x_dir=(-1, 0, 0), z_dir=(0, -1, 0))) as fillet2_piece_2:
        with BuildLine():
            CenterArc((2 - FILLET2_R, -FILLET2_R), FILLET2_R, 0, 90)
            Line((2 - FILLET2_R, 0), (2, 0))
            Line((2, 0), (2, -FILLET2_R))
        make_face()
    revolve(axis=Axis((-0.5, 115.5, -33.153862192), (0, 0, -1)), revolution_arc=90, mode=Mode.SUBTRACT)
    with BuildSketch(Plane(origin=(84.5, 0, -5.317667186), x_dir=(0, 1, 0), z_dir=(0, 0, 1)), Plane(origin=(-2.5, 0, 58.5), x_dir=(0, 1, 0), z_dir=(0, 0, -1))) as fillet2_piece_3:
        with BuildLine():
            CenterArc((FILLET2_R, FILLET2_R), FILLET2_R, 180, 90)
            Line((0, FILLET2_R), (0, 0))
            Line((0, 0), (FILLET2_R, 0))
        make_face()
    extrude(amount=63.817667186, mode=Mode.SUBTRACT)
    with BuildSketch(Plane(origin=(84.5, 117.5, -31.153862192), x_dir=(-1, 0, 0), z_dir=(0, 0, 1))) as fillet2_piece_4:
        with BuildLine():
            CenterArc((FILLET2_R, FILLET2_R), FILLET2_R, 180, 90)
            Line((0, FILLET2_R), (0, 0))
            Line((0, 0), (FILLET2_R, 0))
        make_face()
    extrude(amount=89.653862192, mode=Mode.SUBTRACT)
    with BuildSketch(Plane(origin=(84.5, 37.737088179, 4.948961936), x_dir=(0, 0, -1), z_dir=(0, 1, 0))) as fillet2_piece_5:
        with BuildLine():
            CenterArc((38.102824128 - FILLET2_R, FILLET2_R), FILLET2_R, 270, 90)
            Line((38.102824128, FILLET2_R), (38.102824128, 0))
            Line((38.102824128, 0), (38.102824128 - FILLET2_R, 0))
        make_face()
    revolve(axis=Axis((84.5, 37.737088179, 4.948961936), (-1, 0, 0)), revolution_arc=89.576139728, mode=Mode.SUBTRACT)
    with BuildSketch(Plane(origin=(84.5, 37.737088179, -33.153862192), x_dir=(0, 0, 1), z_dir=(0, 1, 0)), Plane(origin=(-2.5, 115.5, -33.153862192), x_dir=(0, 0, 1), z_dir=(0, -1, 0))) as fillet2_piece_6:
        with BuildLine():
            CenterArc((FILLET2_R, -FILLET2_R), FILLET2_R, 90, 90)
            Line((0, -FILLET2_R), (0, 0))
            Line((0, 0), (FILLET2_R, 0))
        make_face()
    extrude(amount=77.762911821, mode=Mode.SUBTRACT)
    with BuildSketch(Plane(origin=(-0.5, 117.5, -33.153862192), x_dir=(0, 0, 1), z_dir=(1, 0, 0))) as fillet2_piece_7:
        with BuildLine():
            CenterArc((FILLET2_R, FILLET2_R), FILLET2_R, 180, 90)
            Line((0, FILLET2_R), (0, 0))
            Line((0, 0), (FILLET2_R, 0))
        make_face()
    extrude(amount=83, mode=Mode.SUBTRACT)
    with BuildSketch(Plane(origin=(-2.5, 37.737088179, 4.948961936), x_dir=(0, 0, -1), z_dir=(0, 1, 0))) as fillet2_piece_8:
        with BuildLine():
            CenterArc((38.102824128 - FILLET2_R, -FILLET2_R), FILLET2_R, 0, 90)
            Line((38.102824128, -FILLET2_R), (38.102824128, 0))
            Line((38.102824128, 0), (38.102824128 - FILLET2_R, 0))
        make_face()
    revolve(axis=Axis((-2.5, 37.737088179, 4.948961936), (-1, 0, 0)), revolution_arc=89.576139728, mode=Mode.SUBTRACT)

    # Sketch32 → Cut-Extrude15 (cut)
    with BuildSketch(Plane(origin=(84.5, 0, 0), x_dir=(0, 0, -1), z_dir=(1, 0, 0))):
        with Locations((16.153862192, 85.5)):
            Rectangle(SKETCH32_W, SKETCH32_H)
    extrude(amount=-CUT_EXTRUDE15_DEPTH, mode=Mode.SUBTRACT)

    # Sketch33 → Cut-Extrude16 (cut)
    with BuildSketch(Plane(origin=(84.5, 0, 0), x_dir=(0, 0, -1), z_dir=(1, 0, 0))):
        with Locations(Location((-31.346137808, 90.5, 0), (0, 0, 90))):
            Circle(SKETCH33_R)
        with Locations(Location((-31.346137808, 80.5, 0), (0, 0, 90))):
            Circle(SKETCH33_R)
    extrude(amount=-CUT_EXTRUDE16_DEPTH, mode=Mode.SUBTRACT)

    # Sketch37 → Boss-Extrude17 (add)
    with BuildSketch(Plane.ZY.offset(2.5)):
        with Locations((18.25, 14.5)):
            Rectangle(SKETCH37_W, SKETCH37_H)
    extrude(amount=BOSS_EXTRUDE17_DEPTH)

    # Sketch37<2> → Boss-Extrude18 (add)
    with BuildSketch(Plane.ZY.offset(2.5).offset(BOSS_EXTRUDE18_START)):
        with Locations((18.25, 14.5)):
            Rectangle(SKETCH37_2_W, SKETCH37_2_H)
    extrude(amount=-BOSS_EXTRUDE18_DEPTH)

    # Sketch39 → Cut-Extrude17 (cut)
    with BuildSketch(Plane(origin=(0, 0, 16), x_dir=(-1, 0, 0), z_dir=(0, 0, -1))):
        with Locations((10, 10)):
            Circle(SKETCH39_R)
        with Locations((10, 20)):
            Circle(SKETCH39_R)
    extrude(amount=-CUT_EXTRUDE17_DEPTH, mode=Mode.SUBTRACT)

    # Sketch40 → Cut-Extrude18 (cut)
    with BuildSketch(Plane(origin=(0, 0, 16), x_dir=(-1, 0, 0), z_dir=(0, 0, -1))):
        with Locations((-92, 10)):
            Circle(SKETCH40_R)
        with Locations((-92, 20)):
            Circle(SKETCH40_R)
    extrude(amount=-CUT_EXTRUDE18_DEPTH, mode=Mode.SUBTRACT)


solid = part.part
